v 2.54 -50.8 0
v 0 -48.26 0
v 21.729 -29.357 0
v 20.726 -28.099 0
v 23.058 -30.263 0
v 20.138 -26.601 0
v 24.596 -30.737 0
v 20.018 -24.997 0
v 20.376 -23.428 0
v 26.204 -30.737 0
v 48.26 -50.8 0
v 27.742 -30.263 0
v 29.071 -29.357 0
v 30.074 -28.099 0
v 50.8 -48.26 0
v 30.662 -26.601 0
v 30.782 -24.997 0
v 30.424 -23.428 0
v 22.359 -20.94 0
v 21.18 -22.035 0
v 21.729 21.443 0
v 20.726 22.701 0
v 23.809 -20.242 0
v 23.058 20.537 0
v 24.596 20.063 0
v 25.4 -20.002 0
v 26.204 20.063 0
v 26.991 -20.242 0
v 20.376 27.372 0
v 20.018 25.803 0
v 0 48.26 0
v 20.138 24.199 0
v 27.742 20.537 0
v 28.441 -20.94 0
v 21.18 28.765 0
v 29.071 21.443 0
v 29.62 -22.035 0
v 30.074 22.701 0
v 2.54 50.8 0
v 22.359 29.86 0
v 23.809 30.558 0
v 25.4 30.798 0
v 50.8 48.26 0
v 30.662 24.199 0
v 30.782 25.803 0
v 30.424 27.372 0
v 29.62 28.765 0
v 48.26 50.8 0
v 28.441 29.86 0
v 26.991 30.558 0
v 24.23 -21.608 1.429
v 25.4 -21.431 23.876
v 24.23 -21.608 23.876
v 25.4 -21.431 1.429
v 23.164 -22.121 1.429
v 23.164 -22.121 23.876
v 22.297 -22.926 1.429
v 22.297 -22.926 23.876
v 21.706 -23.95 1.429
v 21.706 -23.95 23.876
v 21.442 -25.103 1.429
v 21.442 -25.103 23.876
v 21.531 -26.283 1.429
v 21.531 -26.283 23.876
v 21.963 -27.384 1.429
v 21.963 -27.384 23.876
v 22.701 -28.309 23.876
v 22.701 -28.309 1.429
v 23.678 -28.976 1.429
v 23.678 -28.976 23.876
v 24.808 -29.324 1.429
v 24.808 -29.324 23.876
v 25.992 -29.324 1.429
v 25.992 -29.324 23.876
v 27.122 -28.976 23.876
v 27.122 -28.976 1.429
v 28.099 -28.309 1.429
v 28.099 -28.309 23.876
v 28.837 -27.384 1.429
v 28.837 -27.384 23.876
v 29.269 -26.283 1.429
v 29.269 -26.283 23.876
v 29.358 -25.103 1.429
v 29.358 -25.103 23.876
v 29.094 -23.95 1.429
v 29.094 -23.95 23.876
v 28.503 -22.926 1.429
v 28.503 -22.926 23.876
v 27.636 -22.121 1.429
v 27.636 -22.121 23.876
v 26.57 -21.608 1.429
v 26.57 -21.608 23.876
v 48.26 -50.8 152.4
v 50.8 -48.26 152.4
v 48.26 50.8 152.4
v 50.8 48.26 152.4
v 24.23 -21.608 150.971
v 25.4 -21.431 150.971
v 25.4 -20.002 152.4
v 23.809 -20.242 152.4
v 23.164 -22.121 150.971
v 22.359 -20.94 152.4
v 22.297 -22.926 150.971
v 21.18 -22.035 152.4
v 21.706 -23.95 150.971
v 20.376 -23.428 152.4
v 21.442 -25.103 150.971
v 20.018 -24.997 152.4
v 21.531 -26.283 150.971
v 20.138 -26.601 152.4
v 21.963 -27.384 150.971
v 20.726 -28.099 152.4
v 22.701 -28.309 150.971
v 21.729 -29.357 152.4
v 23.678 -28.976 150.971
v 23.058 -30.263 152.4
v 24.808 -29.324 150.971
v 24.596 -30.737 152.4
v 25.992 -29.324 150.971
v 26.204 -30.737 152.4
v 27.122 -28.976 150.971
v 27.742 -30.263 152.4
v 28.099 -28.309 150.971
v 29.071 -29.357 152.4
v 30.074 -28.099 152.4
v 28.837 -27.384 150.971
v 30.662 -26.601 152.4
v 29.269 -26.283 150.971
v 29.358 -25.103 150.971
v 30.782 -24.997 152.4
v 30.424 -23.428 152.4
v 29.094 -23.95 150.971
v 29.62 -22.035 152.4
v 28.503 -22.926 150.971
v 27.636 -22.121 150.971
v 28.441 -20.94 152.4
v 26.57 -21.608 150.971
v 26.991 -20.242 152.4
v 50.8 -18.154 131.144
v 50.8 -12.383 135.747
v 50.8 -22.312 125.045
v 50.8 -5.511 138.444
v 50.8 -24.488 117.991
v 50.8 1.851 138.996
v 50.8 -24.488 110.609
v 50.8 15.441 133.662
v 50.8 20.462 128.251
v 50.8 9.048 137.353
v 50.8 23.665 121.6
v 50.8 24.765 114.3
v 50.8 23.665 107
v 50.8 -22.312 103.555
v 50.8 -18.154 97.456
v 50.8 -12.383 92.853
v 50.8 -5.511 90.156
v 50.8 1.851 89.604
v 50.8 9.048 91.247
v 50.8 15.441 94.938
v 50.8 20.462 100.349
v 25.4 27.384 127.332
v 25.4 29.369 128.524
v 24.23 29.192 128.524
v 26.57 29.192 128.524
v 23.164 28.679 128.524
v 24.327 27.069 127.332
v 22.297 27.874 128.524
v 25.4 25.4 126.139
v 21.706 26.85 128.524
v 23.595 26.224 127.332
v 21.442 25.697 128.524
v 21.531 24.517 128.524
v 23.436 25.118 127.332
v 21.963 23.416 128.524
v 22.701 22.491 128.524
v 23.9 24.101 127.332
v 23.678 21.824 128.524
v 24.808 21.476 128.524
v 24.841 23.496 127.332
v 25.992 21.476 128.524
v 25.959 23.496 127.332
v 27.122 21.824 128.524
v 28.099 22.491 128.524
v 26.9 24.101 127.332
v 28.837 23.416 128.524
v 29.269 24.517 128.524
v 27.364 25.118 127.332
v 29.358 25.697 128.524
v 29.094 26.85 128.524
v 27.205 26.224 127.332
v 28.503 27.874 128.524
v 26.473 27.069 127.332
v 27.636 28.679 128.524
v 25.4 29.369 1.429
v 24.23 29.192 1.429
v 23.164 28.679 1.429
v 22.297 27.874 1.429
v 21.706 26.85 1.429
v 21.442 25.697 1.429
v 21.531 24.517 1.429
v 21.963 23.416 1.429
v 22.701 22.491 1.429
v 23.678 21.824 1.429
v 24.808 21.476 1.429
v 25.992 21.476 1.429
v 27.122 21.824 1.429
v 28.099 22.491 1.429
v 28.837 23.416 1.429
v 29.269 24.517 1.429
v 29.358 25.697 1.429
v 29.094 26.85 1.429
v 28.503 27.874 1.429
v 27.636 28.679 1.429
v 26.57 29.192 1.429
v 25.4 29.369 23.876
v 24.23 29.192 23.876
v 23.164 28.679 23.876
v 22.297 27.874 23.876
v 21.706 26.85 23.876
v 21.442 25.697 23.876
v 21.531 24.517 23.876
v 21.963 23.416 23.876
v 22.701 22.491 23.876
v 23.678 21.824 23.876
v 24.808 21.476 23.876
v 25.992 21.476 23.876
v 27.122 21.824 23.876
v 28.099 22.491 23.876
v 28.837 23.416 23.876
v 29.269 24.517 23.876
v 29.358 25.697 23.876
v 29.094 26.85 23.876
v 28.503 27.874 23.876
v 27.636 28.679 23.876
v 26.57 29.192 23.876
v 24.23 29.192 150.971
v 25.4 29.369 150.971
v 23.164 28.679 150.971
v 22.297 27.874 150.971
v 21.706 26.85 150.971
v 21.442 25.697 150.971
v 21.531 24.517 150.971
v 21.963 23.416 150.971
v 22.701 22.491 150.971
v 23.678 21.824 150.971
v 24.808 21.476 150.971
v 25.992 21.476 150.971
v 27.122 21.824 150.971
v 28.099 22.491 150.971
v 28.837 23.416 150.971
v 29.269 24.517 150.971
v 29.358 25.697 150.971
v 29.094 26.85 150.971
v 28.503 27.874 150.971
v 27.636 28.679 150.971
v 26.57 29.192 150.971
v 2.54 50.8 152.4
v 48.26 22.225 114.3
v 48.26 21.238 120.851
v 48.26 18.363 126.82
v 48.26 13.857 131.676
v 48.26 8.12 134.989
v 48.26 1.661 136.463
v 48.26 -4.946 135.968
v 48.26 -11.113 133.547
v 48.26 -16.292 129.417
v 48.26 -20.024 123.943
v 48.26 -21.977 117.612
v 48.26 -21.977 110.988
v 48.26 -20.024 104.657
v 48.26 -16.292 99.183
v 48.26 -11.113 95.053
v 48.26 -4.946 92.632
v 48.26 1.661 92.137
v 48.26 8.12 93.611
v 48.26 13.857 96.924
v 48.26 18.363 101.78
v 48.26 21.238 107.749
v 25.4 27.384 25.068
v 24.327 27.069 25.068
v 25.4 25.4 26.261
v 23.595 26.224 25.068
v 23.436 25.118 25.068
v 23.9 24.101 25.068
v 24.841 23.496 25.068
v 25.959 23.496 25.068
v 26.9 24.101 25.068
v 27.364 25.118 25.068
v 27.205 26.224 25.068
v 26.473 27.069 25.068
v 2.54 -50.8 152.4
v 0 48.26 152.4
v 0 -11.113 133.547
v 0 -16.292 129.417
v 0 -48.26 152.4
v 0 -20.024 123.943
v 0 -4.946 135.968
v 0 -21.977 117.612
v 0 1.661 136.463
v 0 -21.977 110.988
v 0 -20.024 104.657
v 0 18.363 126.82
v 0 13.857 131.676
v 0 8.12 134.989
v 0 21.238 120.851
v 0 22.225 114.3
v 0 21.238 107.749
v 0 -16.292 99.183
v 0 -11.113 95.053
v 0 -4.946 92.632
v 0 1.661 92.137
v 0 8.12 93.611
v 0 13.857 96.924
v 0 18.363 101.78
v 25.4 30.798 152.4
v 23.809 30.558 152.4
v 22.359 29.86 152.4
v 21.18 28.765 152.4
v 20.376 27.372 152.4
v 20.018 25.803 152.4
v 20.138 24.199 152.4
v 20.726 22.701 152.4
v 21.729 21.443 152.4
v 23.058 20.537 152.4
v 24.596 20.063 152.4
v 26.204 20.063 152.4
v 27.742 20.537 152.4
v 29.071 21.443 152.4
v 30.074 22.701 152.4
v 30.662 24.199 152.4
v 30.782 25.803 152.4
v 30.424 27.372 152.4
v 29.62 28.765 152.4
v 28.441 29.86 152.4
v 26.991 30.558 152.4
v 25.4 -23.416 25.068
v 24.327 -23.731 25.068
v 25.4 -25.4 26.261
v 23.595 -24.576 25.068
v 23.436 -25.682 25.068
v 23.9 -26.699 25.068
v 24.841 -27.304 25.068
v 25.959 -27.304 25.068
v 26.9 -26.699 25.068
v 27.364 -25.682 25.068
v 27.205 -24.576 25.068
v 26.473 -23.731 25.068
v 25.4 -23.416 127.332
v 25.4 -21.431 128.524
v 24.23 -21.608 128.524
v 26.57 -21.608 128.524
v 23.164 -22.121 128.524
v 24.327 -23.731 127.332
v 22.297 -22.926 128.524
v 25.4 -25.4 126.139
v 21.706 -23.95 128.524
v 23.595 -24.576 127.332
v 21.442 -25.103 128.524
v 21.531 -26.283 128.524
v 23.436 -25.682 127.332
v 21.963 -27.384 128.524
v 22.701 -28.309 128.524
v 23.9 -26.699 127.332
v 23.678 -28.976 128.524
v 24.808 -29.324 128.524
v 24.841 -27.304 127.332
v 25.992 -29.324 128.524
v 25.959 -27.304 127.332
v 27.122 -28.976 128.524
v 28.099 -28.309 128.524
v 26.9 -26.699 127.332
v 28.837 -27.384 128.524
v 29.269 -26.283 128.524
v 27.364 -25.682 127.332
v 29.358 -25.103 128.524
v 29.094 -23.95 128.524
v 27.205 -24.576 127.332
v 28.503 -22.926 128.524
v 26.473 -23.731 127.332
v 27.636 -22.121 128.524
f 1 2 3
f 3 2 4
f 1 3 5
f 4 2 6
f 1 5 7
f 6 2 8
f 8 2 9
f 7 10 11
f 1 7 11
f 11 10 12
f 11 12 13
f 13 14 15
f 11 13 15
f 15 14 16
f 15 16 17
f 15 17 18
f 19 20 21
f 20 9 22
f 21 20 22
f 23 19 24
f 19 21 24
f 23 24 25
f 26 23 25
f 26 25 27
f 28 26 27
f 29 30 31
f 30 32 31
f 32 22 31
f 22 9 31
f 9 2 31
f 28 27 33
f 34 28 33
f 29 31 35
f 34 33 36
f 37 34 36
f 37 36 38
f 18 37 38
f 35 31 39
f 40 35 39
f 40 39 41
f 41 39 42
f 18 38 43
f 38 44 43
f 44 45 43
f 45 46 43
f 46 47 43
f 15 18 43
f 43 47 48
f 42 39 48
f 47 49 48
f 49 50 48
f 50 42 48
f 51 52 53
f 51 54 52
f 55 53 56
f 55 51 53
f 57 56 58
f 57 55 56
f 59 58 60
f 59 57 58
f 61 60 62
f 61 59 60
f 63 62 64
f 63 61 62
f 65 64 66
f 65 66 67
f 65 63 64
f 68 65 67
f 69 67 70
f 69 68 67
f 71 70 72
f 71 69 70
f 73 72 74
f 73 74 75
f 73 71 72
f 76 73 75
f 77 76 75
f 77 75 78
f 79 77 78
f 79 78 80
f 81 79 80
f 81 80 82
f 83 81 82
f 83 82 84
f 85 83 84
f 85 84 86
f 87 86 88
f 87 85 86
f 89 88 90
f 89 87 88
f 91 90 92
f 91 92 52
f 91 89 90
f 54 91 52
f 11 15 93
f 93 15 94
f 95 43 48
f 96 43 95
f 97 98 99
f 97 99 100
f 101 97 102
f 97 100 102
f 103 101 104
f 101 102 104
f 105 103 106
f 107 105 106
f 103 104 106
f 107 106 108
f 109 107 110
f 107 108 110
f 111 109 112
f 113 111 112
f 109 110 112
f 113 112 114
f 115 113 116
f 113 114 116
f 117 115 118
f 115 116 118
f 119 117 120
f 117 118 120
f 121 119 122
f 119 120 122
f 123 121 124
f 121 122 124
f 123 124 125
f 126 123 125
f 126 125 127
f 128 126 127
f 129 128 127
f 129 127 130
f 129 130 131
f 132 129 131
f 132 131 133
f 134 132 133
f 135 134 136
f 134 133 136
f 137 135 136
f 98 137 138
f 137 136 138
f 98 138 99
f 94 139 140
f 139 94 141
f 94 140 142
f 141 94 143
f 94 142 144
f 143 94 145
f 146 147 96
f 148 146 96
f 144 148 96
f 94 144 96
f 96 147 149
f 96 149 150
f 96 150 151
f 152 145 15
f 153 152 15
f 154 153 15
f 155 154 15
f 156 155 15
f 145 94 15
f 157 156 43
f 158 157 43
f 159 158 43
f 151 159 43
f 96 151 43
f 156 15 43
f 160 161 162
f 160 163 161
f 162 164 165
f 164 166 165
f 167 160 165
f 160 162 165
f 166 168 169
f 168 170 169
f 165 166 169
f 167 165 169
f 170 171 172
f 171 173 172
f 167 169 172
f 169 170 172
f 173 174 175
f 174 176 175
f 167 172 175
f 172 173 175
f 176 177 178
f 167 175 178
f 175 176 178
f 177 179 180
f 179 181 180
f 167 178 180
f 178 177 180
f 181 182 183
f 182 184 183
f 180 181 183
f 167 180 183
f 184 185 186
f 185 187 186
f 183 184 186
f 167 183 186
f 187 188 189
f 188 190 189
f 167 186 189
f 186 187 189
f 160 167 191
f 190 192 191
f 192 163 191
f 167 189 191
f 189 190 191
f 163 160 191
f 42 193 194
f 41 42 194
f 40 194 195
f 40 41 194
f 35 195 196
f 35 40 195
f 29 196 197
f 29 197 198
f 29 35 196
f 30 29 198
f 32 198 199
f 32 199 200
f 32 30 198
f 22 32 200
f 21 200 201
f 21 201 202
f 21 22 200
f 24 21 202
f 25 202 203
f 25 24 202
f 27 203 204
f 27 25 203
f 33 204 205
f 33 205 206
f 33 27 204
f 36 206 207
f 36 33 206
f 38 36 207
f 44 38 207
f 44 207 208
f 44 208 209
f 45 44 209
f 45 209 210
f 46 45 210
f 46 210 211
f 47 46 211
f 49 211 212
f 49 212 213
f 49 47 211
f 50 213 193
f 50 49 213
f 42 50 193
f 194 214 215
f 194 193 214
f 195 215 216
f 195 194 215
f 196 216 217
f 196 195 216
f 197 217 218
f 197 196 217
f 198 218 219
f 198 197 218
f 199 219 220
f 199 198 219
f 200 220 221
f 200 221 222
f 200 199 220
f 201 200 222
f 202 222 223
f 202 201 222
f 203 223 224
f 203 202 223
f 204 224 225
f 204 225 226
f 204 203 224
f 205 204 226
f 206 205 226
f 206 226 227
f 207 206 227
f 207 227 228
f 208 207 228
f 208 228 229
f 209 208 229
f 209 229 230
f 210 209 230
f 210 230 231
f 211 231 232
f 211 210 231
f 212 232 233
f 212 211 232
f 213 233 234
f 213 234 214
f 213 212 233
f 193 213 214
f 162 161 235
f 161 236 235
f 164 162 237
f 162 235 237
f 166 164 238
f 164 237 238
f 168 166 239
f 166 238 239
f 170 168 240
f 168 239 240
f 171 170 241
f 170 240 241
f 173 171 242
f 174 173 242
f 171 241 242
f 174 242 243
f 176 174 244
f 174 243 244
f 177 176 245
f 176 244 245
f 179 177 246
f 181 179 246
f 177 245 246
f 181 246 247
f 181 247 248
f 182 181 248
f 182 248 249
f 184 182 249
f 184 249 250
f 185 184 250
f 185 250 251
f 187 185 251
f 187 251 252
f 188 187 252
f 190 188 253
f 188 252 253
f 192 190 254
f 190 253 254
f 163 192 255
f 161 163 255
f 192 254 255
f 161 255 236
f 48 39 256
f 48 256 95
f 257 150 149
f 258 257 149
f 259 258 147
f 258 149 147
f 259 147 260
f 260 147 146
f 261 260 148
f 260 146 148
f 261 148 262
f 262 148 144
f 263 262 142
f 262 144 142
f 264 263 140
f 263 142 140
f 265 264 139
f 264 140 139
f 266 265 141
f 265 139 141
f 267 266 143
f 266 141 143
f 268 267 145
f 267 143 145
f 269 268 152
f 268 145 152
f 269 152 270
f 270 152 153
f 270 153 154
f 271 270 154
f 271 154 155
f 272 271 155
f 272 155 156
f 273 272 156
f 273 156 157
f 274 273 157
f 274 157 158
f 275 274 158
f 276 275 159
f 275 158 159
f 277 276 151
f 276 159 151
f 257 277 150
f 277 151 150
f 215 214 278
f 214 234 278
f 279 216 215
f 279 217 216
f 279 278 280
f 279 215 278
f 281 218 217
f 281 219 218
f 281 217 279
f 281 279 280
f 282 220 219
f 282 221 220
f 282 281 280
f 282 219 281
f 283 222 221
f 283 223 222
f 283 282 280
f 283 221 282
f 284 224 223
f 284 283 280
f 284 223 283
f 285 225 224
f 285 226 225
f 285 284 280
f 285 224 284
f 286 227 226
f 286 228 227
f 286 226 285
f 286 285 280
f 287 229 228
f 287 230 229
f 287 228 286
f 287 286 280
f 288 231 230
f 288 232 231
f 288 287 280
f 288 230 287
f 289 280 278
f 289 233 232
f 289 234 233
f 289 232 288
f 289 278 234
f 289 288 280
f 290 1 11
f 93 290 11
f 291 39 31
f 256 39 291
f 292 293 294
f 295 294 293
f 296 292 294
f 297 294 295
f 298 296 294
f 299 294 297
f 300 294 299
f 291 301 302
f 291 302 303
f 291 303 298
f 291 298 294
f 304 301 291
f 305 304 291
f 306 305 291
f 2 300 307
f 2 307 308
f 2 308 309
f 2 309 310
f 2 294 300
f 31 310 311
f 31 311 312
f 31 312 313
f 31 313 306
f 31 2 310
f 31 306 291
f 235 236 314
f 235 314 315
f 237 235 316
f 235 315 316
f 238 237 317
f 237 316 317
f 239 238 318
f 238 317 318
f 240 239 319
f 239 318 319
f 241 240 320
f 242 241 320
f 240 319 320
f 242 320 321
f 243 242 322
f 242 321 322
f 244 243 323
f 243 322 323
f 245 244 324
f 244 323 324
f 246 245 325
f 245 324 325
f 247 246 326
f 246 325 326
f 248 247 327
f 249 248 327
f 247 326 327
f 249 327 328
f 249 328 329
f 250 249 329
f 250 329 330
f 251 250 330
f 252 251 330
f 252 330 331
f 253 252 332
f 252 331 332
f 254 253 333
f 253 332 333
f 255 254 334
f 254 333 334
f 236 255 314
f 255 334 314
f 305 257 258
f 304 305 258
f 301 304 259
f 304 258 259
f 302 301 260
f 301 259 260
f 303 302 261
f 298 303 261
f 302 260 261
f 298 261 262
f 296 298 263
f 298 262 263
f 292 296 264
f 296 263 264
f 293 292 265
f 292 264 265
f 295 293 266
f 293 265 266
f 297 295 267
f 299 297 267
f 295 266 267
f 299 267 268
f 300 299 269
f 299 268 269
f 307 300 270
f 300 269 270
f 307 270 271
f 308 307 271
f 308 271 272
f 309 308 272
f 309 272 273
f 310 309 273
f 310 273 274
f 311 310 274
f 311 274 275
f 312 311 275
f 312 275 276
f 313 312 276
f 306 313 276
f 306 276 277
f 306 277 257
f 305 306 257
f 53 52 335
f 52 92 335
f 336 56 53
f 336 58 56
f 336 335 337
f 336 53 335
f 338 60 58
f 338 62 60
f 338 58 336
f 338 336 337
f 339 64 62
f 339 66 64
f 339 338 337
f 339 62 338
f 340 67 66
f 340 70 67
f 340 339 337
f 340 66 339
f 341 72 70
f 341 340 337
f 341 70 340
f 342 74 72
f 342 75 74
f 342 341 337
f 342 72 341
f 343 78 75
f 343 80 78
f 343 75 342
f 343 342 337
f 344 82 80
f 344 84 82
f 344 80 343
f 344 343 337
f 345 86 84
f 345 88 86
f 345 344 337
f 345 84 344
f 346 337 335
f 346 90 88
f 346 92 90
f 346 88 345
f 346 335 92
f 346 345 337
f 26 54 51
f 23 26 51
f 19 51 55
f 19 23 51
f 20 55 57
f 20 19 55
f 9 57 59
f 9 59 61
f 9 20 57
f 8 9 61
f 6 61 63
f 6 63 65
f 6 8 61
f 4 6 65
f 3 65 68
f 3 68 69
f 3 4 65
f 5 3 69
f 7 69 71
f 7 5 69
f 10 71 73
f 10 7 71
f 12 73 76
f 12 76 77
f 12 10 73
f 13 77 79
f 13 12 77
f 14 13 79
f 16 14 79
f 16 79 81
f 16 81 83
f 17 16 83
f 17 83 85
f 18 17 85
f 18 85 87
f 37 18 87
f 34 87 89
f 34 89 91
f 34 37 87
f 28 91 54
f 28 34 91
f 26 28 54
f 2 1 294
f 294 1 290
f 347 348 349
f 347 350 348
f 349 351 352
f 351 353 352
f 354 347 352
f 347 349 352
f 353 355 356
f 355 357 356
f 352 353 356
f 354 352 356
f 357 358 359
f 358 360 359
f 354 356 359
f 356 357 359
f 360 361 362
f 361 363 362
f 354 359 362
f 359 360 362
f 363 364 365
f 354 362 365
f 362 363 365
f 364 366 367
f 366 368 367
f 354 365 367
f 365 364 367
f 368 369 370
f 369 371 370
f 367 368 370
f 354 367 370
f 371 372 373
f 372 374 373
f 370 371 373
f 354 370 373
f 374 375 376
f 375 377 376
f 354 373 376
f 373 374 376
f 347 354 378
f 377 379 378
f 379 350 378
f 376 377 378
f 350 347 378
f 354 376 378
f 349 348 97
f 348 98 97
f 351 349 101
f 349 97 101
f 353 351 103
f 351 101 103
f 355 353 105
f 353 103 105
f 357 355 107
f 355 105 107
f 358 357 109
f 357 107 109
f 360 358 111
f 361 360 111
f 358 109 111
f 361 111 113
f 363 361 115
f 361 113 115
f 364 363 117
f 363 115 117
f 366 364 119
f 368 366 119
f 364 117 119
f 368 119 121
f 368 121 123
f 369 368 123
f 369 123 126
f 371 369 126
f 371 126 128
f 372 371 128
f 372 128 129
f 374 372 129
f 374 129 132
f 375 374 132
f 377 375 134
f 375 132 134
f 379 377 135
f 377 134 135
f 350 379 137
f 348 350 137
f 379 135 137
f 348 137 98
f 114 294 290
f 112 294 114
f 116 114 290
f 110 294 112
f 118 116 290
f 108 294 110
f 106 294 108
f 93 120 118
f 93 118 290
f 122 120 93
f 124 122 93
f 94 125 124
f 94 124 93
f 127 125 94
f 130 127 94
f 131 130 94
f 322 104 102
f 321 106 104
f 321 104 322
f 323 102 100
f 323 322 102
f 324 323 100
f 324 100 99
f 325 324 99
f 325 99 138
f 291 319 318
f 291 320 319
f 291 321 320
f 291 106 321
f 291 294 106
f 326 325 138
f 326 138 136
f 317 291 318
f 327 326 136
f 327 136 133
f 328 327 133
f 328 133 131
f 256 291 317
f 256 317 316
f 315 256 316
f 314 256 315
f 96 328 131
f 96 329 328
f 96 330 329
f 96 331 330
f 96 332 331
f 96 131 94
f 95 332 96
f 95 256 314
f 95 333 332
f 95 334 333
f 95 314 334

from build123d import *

# Parameters (mm, degrees)
SKETCH1_W                        = 50.8
SKETCH1_H                        = 101.6
EXTRUDE1_DEPTH                   = 152.4
SKETCH2_R                        = 22.225
EXTRUDE2_DEPTH                   = 51.8
CHAMFER1_SIZE                    = 2.54
F_3_8_16_TAPPED_HOLE1_AT_2_COUNT = 2
F_3_8_16_TAPPED_HOLE1_AT_2_PITCH = 50.8


with BuildPart() as part:
    # Sketch1 → Extrude1 (new body)
    with BuildSketch(Plane.XY):
        with Locations((25.4, 0)):
            Rectangle(SKETCH1_W, SKETCH1_H)
    extrude(amount=EXTRUDE1_DEPTH)

    # Sketch2 → Extrude2 (cut, through all)
    with BuildSketch(Plane(origin=(50.8, 0, 0), x_dir=(0, 0, -1), z_dir=(1, 0, 0))):
        with Locations(Location((-114.3, 0, 0), (0, 0, 90))):  # turned: the seam where the file's is
            Circle(SKETCH2_R)
    extrude(amount=-EXTRUDE2_DEPTH, mode=Mode.SUBTRACT)

    # Chamfer1
    chamfer1_edges = [part.edges().sort_by_distance(p)[0] for p in [
        (50.8, -22.225, 114.3),
        (50.8, -50.8, 76.2),
        (0, -50.8, 76.2),
        (0, 50.8, 76.2),
        (50.8, 50.8, 76.2),
    ]]
    chamfer(chamfer1_edges, length=CHAMFER1_SIZE)

    # Sketch3 → 3/8-16 Tapped Hole1 (revolve, cut)
    with BuildSketch(Plane(origin=(25.4, -25.4, 0), x_dir=(0, 1, 0), z_dir=(1, 0, 0))):
        Polygon((0, 0), (0, 26.260665582), (3.96875, 23.876), (3.96875, 1.42875), (5.3975, 0), align=None)
    f_3_8_16_tapped_hole1 = revolve(axis=Axis((25.4, -25.4, -6.35), (0, 0, 1)), mode=Mode.SUBTRACT)

    # 3/8-16 Tapped Hole1 at 2: 3/8-16 Tapped Hole1 ×2
    with Locations(*[(0, i * F_3_8_16_TAPPED_HOLE1_AT_2_PITCH, 0) for i in range(1, F_3_8_16_TAPPED_HOLE1_AT_2_COUNT)]):
        add(f_3_8_16_tapped_hole1, mode=Mode.SUBTRACT)

    # Mirror1: 3/8-16 Tapped Hole1 across plane
    add(f_3_8_16_tapped_hole1.mirror(Plane(origin=(0, 0, 76.2), x_dir=(1, 0, 0), z_dir=(0, 0, -1))), mode=Mode.SUBTRACT)

    # Mirror1 copy 1 sketch → Mirror1 copy 1 (revolve, cut)
    with BuildSketch(Plane(origin=(25.4, 25.4, 152.4), x_dir=(0, 1, 0), z_dir=(1, 0, 0))):
        Polygon((0, 0), (0, -26.260665582), (3.96875, -23.876), (3.96875, -1.42875), (5.3975, 0), align=None)
    revolve(axis=Axis((25.4, 25.4, 158.75), (0, 0, 1)), mode=Mode.SUBTRACT)


solid = part.part
